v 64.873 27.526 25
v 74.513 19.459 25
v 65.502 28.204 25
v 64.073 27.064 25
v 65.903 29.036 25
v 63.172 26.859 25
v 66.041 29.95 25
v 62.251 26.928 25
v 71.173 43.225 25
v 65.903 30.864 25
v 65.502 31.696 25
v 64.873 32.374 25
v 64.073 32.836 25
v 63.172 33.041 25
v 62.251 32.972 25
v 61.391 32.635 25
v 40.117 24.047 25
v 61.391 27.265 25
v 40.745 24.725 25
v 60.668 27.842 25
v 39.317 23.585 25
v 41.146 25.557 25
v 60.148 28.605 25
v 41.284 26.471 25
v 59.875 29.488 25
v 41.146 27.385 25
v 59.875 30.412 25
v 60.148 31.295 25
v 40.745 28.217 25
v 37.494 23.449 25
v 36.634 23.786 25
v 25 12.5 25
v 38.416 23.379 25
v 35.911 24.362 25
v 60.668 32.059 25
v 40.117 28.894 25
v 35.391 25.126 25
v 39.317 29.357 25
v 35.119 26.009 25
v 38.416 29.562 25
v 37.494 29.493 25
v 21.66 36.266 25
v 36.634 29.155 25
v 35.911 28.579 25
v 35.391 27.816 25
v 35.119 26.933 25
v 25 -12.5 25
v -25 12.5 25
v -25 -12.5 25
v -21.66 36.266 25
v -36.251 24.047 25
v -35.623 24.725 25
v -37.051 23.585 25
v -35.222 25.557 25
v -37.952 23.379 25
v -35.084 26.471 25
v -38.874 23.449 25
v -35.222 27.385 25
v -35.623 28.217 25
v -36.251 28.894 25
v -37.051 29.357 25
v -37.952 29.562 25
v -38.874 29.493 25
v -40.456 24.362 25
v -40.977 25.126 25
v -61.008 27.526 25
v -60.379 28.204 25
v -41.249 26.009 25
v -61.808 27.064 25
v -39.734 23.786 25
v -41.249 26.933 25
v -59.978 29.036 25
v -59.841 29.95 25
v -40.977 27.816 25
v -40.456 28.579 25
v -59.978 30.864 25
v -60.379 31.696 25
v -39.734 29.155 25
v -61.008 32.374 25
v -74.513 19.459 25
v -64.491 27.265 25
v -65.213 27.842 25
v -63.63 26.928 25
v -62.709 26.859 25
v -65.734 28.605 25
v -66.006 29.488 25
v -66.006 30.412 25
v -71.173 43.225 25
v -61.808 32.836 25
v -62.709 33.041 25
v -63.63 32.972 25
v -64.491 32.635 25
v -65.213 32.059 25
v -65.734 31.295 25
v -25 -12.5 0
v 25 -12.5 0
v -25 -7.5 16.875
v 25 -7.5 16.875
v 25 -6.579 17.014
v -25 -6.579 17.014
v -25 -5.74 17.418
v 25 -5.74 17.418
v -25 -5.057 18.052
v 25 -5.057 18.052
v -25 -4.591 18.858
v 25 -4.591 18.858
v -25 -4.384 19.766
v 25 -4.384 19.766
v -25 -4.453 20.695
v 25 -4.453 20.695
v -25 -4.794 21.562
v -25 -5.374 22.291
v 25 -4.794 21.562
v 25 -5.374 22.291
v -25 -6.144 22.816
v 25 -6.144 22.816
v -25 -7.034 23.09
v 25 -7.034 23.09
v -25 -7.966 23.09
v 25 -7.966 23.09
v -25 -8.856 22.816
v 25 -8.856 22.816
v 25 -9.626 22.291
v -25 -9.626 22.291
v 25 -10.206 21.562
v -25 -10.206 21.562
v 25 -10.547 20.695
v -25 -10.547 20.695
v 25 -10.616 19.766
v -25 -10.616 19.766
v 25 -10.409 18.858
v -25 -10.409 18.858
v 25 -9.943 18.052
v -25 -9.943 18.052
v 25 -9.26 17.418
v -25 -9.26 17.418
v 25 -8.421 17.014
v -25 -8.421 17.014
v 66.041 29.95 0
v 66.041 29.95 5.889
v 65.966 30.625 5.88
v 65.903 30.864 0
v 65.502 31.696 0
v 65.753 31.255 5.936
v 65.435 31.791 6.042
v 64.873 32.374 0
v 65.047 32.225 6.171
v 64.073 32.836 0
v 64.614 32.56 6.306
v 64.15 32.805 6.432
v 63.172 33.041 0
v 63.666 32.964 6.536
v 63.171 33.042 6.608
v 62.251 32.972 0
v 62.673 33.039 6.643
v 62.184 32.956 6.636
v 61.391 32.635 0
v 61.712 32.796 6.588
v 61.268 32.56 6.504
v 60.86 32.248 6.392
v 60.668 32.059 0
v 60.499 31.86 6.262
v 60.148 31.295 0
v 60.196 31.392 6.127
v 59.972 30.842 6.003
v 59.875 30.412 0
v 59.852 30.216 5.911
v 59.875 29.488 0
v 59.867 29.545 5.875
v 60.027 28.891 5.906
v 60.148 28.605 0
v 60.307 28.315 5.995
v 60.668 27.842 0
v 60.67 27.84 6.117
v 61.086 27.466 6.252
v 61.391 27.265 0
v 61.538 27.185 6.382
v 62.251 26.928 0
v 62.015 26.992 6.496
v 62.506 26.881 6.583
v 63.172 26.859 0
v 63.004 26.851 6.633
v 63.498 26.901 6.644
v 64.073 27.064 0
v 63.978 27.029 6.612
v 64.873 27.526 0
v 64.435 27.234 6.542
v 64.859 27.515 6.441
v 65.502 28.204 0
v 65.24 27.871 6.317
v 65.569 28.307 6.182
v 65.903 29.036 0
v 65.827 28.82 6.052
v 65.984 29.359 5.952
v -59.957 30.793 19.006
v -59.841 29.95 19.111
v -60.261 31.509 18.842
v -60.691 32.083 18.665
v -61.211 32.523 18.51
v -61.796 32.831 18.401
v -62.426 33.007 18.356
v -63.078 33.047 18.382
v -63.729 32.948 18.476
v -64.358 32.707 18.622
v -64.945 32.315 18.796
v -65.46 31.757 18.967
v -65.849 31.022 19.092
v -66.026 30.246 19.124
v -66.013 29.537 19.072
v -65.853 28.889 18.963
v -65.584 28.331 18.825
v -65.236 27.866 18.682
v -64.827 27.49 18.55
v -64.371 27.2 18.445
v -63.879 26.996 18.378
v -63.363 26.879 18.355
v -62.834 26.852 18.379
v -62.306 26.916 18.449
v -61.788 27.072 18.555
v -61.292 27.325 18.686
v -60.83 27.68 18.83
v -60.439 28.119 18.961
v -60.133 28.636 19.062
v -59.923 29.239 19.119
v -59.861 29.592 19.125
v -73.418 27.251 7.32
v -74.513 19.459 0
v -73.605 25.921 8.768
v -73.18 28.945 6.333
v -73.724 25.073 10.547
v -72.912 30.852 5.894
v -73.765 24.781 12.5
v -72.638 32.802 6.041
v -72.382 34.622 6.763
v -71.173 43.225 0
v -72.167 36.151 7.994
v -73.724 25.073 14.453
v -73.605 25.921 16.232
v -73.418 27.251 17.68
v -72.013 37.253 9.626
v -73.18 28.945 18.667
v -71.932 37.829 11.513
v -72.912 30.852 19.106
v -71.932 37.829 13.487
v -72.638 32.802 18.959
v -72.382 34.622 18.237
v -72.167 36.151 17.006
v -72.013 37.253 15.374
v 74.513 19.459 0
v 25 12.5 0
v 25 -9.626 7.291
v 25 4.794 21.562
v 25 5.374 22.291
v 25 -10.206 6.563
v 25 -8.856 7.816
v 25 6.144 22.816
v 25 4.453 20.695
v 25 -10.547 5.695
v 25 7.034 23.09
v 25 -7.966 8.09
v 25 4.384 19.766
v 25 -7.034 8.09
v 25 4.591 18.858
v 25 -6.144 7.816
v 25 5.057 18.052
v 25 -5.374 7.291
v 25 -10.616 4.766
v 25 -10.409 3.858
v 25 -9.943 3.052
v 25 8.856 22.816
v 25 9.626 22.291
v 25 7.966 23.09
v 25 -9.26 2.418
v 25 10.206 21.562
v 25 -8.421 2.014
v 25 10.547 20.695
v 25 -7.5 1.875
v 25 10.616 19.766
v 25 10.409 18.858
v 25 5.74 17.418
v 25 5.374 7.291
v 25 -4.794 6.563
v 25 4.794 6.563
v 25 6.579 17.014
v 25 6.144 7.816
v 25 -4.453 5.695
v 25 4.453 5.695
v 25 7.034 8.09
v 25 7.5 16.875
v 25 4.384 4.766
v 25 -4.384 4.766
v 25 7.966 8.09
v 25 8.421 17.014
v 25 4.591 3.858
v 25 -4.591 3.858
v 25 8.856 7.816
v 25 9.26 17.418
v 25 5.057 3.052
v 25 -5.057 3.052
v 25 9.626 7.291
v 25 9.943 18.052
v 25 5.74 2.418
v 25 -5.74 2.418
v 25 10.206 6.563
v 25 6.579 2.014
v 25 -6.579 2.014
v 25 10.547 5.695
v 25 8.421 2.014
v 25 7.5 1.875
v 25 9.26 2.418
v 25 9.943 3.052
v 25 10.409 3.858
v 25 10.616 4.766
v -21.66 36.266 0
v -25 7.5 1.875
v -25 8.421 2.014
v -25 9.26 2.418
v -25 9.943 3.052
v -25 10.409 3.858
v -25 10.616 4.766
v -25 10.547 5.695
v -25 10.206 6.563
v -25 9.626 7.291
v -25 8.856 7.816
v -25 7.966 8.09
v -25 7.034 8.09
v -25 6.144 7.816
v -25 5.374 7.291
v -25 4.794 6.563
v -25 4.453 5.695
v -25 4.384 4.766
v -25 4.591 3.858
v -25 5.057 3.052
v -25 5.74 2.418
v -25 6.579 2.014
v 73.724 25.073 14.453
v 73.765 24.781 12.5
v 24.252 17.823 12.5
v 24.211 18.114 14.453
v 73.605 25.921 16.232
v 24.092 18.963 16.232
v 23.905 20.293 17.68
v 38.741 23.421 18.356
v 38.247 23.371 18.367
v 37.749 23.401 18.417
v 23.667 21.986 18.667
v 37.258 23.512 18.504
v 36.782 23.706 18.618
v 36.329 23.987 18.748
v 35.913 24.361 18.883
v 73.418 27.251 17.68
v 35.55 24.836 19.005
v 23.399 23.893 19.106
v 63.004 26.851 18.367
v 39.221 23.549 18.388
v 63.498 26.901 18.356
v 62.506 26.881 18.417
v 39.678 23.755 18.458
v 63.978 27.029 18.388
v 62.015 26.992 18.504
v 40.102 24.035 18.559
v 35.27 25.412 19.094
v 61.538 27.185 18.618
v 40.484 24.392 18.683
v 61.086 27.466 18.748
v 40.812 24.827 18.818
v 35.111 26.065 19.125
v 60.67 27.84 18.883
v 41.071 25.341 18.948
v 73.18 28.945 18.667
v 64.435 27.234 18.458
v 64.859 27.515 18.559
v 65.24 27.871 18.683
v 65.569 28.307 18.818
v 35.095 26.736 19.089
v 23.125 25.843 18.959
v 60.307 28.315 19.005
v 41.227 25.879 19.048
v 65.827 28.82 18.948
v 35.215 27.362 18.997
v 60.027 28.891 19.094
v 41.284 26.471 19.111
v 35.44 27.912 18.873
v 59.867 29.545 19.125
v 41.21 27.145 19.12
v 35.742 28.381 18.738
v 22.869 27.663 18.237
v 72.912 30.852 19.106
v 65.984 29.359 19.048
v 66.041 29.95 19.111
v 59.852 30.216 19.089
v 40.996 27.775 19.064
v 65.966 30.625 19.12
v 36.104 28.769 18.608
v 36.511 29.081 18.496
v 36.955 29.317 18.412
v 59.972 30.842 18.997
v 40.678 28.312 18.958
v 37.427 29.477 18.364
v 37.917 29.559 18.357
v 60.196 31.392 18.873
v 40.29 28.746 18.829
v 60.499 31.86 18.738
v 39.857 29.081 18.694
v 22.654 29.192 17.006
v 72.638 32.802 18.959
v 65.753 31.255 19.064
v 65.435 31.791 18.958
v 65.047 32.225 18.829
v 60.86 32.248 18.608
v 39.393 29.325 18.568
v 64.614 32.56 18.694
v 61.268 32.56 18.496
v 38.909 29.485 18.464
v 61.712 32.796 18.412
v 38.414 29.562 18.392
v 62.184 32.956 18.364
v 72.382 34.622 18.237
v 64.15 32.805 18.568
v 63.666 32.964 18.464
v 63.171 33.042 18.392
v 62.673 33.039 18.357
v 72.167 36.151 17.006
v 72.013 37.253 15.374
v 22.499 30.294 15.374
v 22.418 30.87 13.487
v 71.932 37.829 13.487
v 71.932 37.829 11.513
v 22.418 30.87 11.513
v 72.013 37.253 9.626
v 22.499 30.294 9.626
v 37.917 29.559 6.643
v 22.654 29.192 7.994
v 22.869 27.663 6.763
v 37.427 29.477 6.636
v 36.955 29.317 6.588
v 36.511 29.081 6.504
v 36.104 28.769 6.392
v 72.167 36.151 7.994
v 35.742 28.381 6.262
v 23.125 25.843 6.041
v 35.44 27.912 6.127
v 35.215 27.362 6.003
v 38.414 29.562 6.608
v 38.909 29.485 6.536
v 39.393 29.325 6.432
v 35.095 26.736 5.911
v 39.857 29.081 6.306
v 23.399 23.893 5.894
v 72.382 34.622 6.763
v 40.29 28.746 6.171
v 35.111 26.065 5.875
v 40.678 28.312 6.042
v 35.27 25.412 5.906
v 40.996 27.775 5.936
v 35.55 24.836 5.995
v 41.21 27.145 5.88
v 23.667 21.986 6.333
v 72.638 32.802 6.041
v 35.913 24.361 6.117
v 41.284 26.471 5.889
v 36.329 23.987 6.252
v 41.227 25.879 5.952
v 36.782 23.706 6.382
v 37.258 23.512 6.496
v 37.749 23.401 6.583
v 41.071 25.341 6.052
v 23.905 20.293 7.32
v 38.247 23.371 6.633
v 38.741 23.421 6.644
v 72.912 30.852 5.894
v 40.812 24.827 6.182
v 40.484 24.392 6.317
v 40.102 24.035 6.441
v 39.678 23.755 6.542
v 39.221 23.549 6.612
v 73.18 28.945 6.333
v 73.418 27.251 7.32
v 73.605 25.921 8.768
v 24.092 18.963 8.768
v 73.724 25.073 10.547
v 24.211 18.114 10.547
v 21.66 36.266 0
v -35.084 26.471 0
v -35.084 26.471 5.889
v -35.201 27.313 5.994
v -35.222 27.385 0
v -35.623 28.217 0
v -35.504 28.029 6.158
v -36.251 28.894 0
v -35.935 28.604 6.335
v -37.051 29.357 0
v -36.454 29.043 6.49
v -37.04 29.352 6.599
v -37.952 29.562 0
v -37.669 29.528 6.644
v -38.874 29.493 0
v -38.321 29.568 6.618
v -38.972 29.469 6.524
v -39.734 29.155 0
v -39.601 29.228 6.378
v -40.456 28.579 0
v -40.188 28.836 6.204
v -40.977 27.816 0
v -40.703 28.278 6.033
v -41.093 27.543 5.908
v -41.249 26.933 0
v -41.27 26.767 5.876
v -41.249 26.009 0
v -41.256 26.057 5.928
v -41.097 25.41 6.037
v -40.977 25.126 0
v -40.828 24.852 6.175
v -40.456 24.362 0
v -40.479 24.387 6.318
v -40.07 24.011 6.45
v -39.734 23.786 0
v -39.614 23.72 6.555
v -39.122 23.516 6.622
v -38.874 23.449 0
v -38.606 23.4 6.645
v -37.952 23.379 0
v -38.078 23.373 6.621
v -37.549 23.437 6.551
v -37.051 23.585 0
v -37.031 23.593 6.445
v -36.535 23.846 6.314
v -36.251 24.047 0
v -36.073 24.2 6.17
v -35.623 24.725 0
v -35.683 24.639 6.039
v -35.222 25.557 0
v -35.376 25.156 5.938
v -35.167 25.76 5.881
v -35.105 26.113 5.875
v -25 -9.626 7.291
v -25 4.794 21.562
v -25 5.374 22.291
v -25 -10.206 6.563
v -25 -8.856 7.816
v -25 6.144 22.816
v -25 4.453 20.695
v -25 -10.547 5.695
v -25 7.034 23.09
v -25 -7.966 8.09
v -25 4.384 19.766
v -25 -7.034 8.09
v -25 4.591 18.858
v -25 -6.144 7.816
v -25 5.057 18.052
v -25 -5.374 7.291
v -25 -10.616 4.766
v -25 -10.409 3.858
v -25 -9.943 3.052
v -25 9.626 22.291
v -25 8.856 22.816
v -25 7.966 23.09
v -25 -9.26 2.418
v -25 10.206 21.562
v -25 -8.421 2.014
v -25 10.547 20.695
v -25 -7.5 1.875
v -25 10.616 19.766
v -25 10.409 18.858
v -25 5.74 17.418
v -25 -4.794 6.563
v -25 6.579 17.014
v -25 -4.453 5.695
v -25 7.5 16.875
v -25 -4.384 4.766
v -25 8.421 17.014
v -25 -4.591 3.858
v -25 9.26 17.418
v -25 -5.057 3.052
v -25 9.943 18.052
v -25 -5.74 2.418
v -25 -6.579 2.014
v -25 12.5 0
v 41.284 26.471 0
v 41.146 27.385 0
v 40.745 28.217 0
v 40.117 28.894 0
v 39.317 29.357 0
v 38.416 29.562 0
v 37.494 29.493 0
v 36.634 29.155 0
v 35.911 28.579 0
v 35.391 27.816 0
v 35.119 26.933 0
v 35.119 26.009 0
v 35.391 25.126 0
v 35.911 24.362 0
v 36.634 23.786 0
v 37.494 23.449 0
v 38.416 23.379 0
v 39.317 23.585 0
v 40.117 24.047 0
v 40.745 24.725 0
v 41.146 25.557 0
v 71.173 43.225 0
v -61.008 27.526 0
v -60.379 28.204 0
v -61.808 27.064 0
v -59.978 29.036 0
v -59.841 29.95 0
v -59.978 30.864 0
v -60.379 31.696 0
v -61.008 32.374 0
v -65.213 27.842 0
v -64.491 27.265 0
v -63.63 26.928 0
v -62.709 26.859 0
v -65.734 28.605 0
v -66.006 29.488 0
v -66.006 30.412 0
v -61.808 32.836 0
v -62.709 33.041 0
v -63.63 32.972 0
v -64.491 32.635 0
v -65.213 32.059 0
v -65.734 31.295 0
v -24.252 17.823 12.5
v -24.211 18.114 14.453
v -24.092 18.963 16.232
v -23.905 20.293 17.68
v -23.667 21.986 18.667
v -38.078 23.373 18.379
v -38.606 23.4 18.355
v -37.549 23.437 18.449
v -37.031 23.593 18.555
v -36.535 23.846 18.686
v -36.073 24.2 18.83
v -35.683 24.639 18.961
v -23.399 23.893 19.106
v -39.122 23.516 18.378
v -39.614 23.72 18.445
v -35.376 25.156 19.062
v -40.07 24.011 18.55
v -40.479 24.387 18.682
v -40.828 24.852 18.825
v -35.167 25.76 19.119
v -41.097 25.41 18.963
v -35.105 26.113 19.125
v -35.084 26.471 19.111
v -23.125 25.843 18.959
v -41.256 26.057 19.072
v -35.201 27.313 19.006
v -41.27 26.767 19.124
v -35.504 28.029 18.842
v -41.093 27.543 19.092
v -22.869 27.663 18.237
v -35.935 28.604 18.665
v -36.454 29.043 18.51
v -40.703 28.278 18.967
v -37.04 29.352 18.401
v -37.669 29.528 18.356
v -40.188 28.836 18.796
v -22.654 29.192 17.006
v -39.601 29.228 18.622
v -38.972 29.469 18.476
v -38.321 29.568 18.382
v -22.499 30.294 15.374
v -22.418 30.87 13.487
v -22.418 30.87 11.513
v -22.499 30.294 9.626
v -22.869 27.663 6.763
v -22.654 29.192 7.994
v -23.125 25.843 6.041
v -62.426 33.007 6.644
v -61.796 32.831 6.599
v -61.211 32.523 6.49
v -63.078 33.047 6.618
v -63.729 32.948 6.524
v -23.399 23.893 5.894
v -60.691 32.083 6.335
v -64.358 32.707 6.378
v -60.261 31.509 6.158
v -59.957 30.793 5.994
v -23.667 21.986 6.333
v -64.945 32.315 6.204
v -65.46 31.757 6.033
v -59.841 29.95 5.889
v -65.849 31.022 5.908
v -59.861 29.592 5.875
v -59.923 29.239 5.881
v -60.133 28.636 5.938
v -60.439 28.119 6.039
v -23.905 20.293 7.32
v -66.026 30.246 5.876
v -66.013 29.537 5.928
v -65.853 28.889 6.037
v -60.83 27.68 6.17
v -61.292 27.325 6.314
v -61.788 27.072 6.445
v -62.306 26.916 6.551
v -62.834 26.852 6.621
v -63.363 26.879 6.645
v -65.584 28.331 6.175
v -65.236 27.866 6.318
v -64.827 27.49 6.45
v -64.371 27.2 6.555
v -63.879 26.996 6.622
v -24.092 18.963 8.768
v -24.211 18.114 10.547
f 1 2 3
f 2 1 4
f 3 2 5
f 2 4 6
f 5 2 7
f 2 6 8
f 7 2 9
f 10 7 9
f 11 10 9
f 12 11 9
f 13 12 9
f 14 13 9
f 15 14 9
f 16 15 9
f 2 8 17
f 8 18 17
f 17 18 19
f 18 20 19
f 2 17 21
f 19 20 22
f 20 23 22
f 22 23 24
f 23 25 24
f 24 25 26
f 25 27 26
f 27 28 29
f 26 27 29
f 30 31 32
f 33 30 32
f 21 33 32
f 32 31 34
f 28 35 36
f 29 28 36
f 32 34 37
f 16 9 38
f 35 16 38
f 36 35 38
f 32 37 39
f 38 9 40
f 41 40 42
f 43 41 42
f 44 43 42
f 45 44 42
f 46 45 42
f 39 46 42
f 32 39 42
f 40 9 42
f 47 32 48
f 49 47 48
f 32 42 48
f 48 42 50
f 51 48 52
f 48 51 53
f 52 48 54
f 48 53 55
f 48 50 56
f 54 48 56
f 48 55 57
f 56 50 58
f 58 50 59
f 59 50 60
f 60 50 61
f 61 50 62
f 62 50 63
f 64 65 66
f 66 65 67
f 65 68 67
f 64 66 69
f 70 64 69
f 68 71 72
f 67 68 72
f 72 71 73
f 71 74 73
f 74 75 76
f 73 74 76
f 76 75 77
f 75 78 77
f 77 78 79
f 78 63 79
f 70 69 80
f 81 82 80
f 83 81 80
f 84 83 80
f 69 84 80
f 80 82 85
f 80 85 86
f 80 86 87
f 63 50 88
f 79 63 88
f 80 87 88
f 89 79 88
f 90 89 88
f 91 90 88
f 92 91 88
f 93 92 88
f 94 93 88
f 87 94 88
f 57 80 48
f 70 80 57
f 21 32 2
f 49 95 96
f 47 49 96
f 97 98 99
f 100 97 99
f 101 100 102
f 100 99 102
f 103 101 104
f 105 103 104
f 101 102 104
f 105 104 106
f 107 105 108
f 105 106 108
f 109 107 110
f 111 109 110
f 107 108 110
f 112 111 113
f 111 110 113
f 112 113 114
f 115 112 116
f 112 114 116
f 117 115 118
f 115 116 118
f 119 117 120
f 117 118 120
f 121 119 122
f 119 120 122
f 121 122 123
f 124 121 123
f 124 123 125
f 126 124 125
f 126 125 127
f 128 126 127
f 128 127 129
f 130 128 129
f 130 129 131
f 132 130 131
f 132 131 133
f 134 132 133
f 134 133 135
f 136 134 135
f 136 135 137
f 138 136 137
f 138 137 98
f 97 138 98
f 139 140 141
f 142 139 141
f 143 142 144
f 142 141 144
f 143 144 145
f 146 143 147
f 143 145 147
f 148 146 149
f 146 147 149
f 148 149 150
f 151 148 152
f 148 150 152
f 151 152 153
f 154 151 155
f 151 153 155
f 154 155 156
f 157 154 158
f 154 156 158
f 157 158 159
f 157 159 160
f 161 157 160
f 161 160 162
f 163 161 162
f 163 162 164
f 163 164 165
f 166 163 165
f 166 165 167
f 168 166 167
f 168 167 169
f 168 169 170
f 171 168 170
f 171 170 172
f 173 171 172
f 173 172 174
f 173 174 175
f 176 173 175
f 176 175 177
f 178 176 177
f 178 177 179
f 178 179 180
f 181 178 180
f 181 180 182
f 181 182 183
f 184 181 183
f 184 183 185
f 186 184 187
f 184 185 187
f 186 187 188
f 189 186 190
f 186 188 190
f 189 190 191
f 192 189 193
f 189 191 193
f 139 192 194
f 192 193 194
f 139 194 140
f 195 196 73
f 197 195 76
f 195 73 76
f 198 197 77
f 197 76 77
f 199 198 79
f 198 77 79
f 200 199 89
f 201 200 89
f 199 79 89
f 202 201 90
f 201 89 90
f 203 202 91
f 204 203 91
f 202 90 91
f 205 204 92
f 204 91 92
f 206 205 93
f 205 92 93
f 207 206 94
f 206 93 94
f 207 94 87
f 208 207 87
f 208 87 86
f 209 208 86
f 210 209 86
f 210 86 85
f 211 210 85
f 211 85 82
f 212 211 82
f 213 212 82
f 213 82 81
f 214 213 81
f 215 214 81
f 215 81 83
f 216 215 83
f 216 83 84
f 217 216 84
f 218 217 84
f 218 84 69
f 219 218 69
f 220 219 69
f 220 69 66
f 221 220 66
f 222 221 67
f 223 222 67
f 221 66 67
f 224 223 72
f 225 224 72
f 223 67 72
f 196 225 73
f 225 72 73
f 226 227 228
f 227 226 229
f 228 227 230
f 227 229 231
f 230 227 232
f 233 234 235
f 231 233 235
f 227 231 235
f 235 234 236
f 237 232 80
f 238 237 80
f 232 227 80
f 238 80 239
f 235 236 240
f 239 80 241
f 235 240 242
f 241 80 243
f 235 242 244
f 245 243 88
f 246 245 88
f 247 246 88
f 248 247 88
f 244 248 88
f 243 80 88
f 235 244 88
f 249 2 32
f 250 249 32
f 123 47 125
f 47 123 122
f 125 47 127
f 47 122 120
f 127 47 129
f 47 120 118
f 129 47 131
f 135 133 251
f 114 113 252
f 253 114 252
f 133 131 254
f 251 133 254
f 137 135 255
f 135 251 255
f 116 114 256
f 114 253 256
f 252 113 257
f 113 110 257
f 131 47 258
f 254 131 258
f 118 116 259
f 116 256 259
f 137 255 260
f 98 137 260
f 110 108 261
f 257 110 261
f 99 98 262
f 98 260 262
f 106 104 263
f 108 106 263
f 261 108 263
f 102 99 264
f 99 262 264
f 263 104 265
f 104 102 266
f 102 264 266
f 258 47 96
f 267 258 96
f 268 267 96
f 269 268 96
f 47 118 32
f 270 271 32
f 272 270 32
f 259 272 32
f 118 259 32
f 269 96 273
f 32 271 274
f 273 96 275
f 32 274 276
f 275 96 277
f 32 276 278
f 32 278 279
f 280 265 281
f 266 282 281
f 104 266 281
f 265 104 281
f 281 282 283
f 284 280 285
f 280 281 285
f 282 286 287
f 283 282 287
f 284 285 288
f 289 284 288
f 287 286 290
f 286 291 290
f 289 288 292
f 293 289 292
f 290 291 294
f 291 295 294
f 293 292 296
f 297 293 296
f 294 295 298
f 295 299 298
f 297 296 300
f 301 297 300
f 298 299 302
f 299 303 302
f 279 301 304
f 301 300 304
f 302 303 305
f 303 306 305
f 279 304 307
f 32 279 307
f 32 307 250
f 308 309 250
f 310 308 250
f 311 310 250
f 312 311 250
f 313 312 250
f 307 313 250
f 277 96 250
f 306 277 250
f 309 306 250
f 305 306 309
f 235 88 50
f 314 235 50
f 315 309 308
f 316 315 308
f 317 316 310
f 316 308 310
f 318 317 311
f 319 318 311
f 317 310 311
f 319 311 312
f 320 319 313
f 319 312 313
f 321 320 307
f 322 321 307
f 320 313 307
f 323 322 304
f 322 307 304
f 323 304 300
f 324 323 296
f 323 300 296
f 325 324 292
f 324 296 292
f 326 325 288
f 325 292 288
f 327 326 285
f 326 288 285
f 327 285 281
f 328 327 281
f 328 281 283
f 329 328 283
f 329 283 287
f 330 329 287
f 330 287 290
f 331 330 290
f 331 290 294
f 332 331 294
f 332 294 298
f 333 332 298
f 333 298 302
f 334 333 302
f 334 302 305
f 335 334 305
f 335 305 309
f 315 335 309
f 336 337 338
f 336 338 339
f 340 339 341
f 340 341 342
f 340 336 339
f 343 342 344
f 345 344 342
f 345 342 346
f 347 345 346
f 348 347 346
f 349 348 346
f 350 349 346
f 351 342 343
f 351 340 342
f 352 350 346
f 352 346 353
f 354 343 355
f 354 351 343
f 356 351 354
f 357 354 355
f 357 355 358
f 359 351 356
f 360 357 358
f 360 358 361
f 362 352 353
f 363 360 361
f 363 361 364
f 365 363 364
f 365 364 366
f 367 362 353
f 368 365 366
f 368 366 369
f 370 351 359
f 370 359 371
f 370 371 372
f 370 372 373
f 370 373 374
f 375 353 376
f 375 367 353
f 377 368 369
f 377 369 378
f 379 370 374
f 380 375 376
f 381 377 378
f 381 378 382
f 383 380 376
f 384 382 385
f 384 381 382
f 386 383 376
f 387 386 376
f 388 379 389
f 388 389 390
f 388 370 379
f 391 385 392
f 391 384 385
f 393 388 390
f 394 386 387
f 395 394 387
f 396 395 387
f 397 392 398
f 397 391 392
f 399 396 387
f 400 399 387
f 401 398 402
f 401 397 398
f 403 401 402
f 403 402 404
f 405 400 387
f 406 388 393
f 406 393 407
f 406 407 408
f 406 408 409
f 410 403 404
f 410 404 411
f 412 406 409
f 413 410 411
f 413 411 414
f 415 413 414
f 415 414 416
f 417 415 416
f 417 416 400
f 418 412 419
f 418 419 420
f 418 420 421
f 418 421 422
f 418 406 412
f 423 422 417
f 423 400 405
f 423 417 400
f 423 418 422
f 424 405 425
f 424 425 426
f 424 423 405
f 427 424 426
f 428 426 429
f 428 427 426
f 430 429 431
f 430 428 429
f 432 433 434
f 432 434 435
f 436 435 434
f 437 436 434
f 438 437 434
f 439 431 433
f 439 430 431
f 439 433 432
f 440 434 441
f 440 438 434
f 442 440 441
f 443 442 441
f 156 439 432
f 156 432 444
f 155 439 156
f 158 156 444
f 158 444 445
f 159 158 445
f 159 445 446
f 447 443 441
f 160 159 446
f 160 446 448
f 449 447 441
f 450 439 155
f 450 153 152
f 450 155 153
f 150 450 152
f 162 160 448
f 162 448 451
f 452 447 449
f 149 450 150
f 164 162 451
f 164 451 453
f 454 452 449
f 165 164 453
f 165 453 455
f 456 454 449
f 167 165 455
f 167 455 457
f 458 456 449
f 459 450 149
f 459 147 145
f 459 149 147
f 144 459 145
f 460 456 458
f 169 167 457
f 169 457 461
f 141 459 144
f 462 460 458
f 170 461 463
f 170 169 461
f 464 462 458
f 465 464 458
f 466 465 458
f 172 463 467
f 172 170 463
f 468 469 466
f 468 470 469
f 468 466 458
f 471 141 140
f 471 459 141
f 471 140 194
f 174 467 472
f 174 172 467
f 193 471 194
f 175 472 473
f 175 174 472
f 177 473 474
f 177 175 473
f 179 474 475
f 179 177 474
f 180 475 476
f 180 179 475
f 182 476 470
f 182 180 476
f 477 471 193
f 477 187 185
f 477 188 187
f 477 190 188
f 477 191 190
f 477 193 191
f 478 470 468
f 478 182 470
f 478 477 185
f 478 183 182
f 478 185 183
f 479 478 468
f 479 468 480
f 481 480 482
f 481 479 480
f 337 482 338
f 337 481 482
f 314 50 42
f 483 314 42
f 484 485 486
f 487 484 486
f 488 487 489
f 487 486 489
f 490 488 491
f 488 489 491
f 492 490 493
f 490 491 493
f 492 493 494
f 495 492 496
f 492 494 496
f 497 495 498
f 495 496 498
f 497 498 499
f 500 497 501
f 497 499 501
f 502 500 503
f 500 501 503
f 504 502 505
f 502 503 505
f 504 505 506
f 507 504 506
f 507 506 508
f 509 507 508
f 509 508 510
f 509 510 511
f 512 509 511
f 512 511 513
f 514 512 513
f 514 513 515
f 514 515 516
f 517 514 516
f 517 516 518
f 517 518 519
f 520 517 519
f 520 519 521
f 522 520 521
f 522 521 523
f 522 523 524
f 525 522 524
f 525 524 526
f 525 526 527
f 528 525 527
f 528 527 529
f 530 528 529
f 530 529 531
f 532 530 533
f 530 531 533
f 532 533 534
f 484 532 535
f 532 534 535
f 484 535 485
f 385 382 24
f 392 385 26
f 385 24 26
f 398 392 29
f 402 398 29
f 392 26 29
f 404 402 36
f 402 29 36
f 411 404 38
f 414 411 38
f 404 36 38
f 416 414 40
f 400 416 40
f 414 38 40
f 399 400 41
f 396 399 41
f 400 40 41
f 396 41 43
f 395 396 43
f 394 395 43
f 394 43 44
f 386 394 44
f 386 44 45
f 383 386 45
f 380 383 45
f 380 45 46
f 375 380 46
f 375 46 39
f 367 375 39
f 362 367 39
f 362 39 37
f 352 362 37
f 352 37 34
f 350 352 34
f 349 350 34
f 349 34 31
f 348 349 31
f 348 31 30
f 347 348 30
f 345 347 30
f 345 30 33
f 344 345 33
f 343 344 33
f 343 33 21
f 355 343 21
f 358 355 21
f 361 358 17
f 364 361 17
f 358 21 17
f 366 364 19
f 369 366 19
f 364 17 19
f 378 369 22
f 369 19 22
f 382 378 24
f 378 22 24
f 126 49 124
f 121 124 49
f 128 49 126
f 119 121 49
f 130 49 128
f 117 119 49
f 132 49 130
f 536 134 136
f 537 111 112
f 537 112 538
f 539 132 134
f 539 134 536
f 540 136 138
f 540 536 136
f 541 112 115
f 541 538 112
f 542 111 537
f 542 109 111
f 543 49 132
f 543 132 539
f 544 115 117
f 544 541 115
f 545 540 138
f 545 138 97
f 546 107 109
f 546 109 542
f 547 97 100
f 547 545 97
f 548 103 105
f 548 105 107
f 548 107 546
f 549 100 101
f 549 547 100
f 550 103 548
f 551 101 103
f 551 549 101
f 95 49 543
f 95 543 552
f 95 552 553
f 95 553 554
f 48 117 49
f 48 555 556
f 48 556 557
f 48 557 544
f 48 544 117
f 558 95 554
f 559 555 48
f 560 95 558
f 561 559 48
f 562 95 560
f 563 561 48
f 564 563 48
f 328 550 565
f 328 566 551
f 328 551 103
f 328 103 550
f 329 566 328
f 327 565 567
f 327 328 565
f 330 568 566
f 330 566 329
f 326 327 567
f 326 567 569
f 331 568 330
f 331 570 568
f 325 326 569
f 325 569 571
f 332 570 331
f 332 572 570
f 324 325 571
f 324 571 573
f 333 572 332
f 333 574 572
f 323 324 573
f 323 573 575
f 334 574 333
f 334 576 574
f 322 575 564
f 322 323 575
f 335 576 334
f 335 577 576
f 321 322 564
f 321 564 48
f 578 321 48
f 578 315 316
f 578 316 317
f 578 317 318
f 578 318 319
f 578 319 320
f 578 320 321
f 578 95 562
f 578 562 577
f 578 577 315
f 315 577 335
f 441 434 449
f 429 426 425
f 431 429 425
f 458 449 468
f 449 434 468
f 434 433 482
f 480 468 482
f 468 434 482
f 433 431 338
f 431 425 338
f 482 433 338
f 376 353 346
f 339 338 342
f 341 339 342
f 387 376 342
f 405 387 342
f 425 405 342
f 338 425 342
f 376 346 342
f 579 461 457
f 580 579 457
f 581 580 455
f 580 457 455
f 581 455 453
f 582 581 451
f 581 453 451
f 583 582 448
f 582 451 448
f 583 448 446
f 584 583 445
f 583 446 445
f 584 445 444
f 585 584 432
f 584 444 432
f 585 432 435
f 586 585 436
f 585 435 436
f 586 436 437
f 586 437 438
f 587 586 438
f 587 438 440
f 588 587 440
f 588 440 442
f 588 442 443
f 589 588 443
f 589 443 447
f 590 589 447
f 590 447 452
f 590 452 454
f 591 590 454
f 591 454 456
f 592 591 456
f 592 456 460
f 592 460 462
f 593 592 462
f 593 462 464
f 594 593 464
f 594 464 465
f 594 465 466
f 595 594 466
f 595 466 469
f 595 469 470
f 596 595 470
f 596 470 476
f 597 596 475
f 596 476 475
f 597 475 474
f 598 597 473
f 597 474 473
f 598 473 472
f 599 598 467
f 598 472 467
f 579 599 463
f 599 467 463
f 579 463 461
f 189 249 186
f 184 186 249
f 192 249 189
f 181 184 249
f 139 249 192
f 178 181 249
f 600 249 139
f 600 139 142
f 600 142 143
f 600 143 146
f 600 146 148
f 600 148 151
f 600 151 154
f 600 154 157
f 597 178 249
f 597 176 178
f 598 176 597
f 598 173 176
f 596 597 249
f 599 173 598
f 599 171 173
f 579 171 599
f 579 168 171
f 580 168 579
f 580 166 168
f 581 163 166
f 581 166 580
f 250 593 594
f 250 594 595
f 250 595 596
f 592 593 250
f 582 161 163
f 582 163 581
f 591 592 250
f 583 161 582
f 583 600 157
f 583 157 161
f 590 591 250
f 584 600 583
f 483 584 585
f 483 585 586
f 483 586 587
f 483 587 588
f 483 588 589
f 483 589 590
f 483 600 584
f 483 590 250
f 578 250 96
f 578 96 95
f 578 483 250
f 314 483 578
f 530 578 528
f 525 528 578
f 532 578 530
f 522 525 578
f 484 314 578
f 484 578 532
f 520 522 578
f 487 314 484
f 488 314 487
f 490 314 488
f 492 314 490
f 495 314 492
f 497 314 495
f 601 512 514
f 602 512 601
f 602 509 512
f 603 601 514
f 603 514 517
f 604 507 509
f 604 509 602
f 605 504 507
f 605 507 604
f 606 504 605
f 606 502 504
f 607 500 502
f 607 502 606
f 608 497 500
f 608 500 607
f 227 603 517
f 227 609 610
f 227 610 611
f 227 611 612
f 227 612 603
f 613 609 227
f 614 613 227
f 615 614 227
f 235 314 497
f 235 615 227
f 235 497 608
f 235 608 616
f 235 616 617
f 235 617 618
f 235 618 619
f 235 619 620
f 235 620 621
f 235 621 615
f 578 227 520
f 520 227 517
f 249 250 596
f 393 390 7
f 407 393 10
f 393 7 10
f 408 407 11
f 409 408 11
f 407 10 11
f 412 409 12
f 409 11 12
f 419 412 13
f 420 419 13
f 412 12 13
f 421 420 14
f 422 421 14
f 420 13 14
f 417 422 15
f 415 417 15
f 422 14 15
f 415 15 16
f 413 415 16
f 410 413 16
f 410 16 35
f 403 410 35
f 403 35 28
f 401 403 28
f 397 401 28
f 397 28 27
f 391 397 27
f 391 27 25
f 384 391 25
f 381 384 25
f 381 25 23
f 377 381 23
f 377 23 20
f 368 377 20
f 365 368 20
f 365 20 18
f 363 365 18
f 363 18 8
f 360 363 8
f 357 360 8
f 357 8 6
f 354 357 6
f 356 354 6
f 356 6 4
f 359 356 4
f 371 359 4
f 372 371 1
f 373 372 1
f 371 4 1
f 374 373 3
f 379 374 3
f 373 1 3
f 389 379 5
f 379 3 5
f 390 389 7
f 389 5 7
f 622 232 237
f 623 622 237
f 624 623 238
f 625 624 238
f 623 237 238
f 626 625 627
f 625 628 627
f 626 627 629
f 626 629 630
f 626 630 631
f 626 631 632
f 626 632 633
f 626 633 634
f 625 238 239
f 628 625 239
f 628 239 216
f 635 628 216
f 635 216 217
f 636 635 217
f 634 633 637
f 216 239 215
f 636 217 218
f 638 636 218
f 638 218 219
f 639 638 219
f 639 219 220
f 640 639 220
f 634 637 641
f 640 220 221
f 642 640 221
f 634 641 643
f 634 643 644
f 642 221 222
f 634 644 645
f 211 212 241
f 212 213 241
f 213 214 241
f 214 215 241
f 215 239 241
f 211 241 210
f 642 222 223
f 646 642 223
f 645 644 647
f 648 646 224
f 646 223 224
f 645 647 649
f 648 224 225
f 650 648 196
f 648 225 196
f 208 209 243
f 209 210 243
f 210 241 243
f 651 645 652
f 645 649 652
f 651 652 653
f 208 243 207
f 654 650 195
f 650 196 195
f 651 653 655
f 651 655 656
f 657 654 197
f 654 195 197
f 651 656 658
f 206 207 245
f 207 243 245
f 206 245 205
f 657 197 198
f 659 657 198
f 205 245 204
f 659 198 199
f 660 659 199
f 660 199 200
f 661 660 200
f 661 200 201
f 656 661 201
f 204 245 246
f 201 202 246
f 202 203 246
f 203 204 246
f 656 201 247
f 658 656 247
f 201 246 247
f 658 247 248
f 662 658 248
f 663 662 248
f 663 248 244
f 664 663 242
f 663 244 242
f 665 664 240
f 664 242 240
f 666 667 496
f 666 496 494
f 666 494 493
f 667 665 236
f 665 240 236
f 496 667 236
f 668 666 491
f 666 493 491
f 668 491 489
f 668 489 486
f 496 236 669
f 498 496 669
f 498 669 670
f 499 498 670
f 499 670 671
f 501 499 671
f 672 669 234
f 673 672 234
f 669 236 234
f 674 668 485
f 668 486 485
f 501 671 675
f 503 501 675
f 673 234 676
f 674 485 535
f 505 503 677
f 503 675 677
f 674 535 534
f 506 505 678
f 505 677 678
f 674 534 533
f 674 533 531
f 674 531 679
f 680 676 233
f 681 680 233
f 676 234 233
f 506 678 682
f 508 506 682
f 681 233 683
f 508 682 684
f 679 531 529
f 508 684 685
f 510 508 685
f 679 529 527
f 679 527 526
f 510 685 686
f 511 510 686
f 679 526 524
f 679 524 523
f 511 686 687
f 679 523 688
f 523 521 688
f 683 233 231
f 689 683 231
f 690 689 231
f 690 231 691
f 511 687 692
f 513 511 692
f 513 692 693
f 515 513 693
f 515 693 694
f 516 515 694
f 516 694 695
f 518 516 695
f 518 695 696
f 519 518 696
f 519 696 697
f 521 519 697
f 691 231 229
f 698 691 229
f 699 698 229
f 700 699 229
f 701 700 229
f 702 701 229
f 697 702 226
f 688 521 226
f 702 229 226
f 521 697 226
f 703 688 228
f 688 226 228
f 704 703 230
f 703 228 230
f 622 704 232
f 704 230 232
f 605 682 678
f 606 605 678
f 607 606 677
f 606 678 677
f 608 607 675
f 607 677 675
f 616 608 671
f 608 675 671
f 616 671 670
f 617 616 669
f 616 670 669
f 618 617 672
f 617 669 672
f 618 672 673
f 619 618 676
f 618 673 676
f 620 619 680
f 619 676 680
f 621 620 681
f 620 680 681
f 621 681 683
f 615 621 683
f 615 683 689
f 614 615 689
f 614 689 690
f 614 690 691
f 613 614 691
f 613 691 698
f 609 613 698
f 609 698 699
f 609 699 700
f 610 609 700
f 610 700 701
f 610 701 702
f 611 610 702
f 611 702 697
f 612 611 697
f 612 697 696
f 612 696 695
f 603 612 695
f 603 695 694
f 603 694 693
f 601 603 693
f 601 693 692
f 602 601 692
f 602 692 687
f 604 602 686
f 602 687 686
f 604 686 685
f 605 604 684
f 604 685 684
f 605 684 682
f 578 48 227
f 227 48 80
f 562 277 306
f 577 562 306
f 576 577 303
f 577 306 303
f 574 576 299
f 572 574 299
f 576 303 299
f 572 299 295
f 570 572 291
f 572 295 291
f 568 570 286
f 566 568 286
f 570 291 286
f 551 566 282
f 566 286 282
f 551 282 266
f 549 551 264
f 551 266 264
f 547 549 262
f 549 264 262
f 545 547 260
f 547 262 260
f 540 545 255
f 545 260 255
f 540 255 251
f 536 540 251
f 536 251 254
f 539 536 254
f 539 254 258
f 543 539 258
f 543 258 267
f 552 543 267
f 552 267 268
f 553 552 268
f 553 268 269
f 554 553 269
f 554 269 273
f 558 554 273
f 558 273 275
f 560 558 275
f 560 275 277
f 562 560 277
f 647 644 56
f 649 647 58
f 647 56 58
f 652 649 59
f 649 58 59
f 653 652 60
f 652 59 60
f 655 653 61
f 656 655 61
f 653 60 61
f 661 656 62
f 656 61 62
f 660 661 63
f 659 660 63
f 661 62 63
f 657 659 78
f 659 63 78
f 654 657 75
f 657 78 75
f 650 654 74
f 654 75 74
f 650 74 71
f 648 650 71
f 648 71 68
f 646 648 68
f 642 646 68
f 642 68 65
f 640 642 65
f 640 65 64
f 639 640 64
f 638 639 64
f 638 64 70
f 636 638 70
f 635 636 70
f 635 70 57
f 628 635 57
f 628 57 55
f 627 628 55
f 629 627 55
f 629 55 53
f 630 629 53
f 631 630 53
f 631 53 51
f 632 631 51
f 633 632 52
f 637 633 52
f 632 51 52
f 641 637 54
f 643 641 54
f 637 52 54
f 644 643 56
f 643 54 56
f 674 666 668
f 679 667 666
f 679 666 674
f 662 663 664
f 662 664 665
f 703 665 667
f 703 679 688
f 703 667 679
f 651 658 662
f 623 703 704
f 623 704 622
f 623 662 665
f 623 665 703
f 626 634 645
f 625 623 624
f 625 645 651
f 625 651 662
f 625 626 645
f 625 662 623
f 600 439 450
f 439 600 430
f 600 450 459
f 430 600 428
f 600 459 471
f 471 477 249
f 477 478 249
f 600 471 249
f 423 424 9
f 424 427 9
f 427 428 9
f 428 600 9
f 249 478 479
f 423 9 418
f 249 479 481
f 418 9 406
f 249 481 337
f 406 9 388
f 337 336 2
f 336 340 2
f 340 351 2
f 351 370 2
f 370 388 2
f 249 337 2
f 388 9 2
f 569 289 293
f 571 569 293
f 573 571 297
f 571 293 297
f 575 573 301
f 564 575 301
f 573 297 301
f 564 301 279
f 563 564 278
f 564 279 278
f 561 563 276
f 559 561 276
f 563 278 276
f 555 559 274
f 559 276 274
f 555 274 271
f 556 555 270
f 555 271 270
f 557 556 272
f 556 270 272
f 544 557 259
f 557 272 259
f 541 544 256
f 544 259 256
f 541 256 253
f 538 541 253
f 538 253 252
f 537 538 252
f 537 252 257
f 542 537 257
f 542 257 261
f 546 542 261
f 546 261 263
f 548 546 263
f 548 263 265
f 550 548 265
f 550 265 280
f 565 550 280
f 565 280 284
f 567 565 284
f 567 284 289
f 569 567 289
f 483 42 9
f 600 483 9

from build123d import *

# Parameters (mm, degrees)
SKETCH1_W           = 50
SKETCH1_H           = 25
BOSS_EXTRUDE1_DEPTH = 25
BOSS_EXTRUDE2_DEPTH = 25
SKETCH4_R           = 6.625
CUT_EXTRUDE1_DEPTH  = 50
SKETCH5_R           = 3.1
CUT_EXTRUDE2_DEPTH  = 90.697578477
SKETCH6_R           = 3.125
CUT_EXTRUDE3_DEPTH  = 112.338788217


with BuildPart() as part:
    # Sketch1 → Boss-Extrude1 (new body)
    with BuildSketch(Plane.XY):
        Rectangle(SKETCH1_W, SKETCH1_H)
    extrude(amount=BOSS_EXTRUDE1_DEPTH)

    # Sketch3 → Boss-Extrude2 (add)
    with BuildSketch(Plane.XY.offset(25)):
        Polygon((-25, 12.5), (-74.513403437, 19.458655048), (-71.173249014, 43.225088698), (-21.659845577, 36.26643365), (21.659845577, 36.26643365), (71.173249014, 43.225088698), (74.513403437, 19.458655048), (25, 12.5), align=None)
    extrude(amount=-BOSS_EXTRUDE2_DEPTH)

    # Sketch4 → Cut-Extrude1 (cut)
    with BuildSketch(Plane(origin=(-75.75190811, 10.646236396, 0), x_dir=(0, 0, 1), z_dir=(-0.9902680687415705, 0.13917310096006502, 0))):
        with Locations(Location((12.5, 20.899023335, 0), (0, 0, 270))):
            Circle(SKETCH4_R)
    cut_extrude1 = extrude(amount=-CUT_EXTRUDE1_DEPTH, mode=Mode.SUBTRACT)

    # Mirror1: Cut-Extrude1 across plane
    add(cut_extrude1.mirror(Plane(origin=(0, 0, 0), x_dir=(0, 0, 1), z_dir=(1, 0, 0))), mode=Mode.SUBTRACT)

    # Sketch5 → Cut-Extrude2 (cut, through all)
    with BuildSketch(Plane.XY.offset(25)):
        with Locations((-62.940645538, 29.950140863)):
            Circle(SKETCH5_R)
        with Locations((-38.18394382, 26.470813339)):
            Circle(SKETCH5_R)
        with Locations((38.18394382, 26.470813339)):
            Circle(SKETCH5_R)
        with Locations((62.940645538, 29.950140863)):
            Circle(SKETCH5_R)
    extrude(amount=-CUT_EXTRUDE2_DEPTH, mode=Mode.SUBTRACT)

    # Sketch6 → Cut-Extrude3 (cut, through all)
    with BuildSketch(Plane(origin=(25, 0, 0), x_dir=(0, 0, -1), z_dir=(1, 0, 0))):
        with Locations((-20, 7.5)):
            Circle(SKETCH6_R)
        with Locations((-5, 7.5)):
            Circle(SKETCH6_R)
        with Locations((-5, -7.5)):
            Circle(SKETCH6_R)
        with Locations((-20, -7.5)):
            Circle(SKETCH6_R)
    extrude(amount=-CUT_EXTRUDE3_DEPTH, mode=Mode.SUBTRACT)


solid = part.part
